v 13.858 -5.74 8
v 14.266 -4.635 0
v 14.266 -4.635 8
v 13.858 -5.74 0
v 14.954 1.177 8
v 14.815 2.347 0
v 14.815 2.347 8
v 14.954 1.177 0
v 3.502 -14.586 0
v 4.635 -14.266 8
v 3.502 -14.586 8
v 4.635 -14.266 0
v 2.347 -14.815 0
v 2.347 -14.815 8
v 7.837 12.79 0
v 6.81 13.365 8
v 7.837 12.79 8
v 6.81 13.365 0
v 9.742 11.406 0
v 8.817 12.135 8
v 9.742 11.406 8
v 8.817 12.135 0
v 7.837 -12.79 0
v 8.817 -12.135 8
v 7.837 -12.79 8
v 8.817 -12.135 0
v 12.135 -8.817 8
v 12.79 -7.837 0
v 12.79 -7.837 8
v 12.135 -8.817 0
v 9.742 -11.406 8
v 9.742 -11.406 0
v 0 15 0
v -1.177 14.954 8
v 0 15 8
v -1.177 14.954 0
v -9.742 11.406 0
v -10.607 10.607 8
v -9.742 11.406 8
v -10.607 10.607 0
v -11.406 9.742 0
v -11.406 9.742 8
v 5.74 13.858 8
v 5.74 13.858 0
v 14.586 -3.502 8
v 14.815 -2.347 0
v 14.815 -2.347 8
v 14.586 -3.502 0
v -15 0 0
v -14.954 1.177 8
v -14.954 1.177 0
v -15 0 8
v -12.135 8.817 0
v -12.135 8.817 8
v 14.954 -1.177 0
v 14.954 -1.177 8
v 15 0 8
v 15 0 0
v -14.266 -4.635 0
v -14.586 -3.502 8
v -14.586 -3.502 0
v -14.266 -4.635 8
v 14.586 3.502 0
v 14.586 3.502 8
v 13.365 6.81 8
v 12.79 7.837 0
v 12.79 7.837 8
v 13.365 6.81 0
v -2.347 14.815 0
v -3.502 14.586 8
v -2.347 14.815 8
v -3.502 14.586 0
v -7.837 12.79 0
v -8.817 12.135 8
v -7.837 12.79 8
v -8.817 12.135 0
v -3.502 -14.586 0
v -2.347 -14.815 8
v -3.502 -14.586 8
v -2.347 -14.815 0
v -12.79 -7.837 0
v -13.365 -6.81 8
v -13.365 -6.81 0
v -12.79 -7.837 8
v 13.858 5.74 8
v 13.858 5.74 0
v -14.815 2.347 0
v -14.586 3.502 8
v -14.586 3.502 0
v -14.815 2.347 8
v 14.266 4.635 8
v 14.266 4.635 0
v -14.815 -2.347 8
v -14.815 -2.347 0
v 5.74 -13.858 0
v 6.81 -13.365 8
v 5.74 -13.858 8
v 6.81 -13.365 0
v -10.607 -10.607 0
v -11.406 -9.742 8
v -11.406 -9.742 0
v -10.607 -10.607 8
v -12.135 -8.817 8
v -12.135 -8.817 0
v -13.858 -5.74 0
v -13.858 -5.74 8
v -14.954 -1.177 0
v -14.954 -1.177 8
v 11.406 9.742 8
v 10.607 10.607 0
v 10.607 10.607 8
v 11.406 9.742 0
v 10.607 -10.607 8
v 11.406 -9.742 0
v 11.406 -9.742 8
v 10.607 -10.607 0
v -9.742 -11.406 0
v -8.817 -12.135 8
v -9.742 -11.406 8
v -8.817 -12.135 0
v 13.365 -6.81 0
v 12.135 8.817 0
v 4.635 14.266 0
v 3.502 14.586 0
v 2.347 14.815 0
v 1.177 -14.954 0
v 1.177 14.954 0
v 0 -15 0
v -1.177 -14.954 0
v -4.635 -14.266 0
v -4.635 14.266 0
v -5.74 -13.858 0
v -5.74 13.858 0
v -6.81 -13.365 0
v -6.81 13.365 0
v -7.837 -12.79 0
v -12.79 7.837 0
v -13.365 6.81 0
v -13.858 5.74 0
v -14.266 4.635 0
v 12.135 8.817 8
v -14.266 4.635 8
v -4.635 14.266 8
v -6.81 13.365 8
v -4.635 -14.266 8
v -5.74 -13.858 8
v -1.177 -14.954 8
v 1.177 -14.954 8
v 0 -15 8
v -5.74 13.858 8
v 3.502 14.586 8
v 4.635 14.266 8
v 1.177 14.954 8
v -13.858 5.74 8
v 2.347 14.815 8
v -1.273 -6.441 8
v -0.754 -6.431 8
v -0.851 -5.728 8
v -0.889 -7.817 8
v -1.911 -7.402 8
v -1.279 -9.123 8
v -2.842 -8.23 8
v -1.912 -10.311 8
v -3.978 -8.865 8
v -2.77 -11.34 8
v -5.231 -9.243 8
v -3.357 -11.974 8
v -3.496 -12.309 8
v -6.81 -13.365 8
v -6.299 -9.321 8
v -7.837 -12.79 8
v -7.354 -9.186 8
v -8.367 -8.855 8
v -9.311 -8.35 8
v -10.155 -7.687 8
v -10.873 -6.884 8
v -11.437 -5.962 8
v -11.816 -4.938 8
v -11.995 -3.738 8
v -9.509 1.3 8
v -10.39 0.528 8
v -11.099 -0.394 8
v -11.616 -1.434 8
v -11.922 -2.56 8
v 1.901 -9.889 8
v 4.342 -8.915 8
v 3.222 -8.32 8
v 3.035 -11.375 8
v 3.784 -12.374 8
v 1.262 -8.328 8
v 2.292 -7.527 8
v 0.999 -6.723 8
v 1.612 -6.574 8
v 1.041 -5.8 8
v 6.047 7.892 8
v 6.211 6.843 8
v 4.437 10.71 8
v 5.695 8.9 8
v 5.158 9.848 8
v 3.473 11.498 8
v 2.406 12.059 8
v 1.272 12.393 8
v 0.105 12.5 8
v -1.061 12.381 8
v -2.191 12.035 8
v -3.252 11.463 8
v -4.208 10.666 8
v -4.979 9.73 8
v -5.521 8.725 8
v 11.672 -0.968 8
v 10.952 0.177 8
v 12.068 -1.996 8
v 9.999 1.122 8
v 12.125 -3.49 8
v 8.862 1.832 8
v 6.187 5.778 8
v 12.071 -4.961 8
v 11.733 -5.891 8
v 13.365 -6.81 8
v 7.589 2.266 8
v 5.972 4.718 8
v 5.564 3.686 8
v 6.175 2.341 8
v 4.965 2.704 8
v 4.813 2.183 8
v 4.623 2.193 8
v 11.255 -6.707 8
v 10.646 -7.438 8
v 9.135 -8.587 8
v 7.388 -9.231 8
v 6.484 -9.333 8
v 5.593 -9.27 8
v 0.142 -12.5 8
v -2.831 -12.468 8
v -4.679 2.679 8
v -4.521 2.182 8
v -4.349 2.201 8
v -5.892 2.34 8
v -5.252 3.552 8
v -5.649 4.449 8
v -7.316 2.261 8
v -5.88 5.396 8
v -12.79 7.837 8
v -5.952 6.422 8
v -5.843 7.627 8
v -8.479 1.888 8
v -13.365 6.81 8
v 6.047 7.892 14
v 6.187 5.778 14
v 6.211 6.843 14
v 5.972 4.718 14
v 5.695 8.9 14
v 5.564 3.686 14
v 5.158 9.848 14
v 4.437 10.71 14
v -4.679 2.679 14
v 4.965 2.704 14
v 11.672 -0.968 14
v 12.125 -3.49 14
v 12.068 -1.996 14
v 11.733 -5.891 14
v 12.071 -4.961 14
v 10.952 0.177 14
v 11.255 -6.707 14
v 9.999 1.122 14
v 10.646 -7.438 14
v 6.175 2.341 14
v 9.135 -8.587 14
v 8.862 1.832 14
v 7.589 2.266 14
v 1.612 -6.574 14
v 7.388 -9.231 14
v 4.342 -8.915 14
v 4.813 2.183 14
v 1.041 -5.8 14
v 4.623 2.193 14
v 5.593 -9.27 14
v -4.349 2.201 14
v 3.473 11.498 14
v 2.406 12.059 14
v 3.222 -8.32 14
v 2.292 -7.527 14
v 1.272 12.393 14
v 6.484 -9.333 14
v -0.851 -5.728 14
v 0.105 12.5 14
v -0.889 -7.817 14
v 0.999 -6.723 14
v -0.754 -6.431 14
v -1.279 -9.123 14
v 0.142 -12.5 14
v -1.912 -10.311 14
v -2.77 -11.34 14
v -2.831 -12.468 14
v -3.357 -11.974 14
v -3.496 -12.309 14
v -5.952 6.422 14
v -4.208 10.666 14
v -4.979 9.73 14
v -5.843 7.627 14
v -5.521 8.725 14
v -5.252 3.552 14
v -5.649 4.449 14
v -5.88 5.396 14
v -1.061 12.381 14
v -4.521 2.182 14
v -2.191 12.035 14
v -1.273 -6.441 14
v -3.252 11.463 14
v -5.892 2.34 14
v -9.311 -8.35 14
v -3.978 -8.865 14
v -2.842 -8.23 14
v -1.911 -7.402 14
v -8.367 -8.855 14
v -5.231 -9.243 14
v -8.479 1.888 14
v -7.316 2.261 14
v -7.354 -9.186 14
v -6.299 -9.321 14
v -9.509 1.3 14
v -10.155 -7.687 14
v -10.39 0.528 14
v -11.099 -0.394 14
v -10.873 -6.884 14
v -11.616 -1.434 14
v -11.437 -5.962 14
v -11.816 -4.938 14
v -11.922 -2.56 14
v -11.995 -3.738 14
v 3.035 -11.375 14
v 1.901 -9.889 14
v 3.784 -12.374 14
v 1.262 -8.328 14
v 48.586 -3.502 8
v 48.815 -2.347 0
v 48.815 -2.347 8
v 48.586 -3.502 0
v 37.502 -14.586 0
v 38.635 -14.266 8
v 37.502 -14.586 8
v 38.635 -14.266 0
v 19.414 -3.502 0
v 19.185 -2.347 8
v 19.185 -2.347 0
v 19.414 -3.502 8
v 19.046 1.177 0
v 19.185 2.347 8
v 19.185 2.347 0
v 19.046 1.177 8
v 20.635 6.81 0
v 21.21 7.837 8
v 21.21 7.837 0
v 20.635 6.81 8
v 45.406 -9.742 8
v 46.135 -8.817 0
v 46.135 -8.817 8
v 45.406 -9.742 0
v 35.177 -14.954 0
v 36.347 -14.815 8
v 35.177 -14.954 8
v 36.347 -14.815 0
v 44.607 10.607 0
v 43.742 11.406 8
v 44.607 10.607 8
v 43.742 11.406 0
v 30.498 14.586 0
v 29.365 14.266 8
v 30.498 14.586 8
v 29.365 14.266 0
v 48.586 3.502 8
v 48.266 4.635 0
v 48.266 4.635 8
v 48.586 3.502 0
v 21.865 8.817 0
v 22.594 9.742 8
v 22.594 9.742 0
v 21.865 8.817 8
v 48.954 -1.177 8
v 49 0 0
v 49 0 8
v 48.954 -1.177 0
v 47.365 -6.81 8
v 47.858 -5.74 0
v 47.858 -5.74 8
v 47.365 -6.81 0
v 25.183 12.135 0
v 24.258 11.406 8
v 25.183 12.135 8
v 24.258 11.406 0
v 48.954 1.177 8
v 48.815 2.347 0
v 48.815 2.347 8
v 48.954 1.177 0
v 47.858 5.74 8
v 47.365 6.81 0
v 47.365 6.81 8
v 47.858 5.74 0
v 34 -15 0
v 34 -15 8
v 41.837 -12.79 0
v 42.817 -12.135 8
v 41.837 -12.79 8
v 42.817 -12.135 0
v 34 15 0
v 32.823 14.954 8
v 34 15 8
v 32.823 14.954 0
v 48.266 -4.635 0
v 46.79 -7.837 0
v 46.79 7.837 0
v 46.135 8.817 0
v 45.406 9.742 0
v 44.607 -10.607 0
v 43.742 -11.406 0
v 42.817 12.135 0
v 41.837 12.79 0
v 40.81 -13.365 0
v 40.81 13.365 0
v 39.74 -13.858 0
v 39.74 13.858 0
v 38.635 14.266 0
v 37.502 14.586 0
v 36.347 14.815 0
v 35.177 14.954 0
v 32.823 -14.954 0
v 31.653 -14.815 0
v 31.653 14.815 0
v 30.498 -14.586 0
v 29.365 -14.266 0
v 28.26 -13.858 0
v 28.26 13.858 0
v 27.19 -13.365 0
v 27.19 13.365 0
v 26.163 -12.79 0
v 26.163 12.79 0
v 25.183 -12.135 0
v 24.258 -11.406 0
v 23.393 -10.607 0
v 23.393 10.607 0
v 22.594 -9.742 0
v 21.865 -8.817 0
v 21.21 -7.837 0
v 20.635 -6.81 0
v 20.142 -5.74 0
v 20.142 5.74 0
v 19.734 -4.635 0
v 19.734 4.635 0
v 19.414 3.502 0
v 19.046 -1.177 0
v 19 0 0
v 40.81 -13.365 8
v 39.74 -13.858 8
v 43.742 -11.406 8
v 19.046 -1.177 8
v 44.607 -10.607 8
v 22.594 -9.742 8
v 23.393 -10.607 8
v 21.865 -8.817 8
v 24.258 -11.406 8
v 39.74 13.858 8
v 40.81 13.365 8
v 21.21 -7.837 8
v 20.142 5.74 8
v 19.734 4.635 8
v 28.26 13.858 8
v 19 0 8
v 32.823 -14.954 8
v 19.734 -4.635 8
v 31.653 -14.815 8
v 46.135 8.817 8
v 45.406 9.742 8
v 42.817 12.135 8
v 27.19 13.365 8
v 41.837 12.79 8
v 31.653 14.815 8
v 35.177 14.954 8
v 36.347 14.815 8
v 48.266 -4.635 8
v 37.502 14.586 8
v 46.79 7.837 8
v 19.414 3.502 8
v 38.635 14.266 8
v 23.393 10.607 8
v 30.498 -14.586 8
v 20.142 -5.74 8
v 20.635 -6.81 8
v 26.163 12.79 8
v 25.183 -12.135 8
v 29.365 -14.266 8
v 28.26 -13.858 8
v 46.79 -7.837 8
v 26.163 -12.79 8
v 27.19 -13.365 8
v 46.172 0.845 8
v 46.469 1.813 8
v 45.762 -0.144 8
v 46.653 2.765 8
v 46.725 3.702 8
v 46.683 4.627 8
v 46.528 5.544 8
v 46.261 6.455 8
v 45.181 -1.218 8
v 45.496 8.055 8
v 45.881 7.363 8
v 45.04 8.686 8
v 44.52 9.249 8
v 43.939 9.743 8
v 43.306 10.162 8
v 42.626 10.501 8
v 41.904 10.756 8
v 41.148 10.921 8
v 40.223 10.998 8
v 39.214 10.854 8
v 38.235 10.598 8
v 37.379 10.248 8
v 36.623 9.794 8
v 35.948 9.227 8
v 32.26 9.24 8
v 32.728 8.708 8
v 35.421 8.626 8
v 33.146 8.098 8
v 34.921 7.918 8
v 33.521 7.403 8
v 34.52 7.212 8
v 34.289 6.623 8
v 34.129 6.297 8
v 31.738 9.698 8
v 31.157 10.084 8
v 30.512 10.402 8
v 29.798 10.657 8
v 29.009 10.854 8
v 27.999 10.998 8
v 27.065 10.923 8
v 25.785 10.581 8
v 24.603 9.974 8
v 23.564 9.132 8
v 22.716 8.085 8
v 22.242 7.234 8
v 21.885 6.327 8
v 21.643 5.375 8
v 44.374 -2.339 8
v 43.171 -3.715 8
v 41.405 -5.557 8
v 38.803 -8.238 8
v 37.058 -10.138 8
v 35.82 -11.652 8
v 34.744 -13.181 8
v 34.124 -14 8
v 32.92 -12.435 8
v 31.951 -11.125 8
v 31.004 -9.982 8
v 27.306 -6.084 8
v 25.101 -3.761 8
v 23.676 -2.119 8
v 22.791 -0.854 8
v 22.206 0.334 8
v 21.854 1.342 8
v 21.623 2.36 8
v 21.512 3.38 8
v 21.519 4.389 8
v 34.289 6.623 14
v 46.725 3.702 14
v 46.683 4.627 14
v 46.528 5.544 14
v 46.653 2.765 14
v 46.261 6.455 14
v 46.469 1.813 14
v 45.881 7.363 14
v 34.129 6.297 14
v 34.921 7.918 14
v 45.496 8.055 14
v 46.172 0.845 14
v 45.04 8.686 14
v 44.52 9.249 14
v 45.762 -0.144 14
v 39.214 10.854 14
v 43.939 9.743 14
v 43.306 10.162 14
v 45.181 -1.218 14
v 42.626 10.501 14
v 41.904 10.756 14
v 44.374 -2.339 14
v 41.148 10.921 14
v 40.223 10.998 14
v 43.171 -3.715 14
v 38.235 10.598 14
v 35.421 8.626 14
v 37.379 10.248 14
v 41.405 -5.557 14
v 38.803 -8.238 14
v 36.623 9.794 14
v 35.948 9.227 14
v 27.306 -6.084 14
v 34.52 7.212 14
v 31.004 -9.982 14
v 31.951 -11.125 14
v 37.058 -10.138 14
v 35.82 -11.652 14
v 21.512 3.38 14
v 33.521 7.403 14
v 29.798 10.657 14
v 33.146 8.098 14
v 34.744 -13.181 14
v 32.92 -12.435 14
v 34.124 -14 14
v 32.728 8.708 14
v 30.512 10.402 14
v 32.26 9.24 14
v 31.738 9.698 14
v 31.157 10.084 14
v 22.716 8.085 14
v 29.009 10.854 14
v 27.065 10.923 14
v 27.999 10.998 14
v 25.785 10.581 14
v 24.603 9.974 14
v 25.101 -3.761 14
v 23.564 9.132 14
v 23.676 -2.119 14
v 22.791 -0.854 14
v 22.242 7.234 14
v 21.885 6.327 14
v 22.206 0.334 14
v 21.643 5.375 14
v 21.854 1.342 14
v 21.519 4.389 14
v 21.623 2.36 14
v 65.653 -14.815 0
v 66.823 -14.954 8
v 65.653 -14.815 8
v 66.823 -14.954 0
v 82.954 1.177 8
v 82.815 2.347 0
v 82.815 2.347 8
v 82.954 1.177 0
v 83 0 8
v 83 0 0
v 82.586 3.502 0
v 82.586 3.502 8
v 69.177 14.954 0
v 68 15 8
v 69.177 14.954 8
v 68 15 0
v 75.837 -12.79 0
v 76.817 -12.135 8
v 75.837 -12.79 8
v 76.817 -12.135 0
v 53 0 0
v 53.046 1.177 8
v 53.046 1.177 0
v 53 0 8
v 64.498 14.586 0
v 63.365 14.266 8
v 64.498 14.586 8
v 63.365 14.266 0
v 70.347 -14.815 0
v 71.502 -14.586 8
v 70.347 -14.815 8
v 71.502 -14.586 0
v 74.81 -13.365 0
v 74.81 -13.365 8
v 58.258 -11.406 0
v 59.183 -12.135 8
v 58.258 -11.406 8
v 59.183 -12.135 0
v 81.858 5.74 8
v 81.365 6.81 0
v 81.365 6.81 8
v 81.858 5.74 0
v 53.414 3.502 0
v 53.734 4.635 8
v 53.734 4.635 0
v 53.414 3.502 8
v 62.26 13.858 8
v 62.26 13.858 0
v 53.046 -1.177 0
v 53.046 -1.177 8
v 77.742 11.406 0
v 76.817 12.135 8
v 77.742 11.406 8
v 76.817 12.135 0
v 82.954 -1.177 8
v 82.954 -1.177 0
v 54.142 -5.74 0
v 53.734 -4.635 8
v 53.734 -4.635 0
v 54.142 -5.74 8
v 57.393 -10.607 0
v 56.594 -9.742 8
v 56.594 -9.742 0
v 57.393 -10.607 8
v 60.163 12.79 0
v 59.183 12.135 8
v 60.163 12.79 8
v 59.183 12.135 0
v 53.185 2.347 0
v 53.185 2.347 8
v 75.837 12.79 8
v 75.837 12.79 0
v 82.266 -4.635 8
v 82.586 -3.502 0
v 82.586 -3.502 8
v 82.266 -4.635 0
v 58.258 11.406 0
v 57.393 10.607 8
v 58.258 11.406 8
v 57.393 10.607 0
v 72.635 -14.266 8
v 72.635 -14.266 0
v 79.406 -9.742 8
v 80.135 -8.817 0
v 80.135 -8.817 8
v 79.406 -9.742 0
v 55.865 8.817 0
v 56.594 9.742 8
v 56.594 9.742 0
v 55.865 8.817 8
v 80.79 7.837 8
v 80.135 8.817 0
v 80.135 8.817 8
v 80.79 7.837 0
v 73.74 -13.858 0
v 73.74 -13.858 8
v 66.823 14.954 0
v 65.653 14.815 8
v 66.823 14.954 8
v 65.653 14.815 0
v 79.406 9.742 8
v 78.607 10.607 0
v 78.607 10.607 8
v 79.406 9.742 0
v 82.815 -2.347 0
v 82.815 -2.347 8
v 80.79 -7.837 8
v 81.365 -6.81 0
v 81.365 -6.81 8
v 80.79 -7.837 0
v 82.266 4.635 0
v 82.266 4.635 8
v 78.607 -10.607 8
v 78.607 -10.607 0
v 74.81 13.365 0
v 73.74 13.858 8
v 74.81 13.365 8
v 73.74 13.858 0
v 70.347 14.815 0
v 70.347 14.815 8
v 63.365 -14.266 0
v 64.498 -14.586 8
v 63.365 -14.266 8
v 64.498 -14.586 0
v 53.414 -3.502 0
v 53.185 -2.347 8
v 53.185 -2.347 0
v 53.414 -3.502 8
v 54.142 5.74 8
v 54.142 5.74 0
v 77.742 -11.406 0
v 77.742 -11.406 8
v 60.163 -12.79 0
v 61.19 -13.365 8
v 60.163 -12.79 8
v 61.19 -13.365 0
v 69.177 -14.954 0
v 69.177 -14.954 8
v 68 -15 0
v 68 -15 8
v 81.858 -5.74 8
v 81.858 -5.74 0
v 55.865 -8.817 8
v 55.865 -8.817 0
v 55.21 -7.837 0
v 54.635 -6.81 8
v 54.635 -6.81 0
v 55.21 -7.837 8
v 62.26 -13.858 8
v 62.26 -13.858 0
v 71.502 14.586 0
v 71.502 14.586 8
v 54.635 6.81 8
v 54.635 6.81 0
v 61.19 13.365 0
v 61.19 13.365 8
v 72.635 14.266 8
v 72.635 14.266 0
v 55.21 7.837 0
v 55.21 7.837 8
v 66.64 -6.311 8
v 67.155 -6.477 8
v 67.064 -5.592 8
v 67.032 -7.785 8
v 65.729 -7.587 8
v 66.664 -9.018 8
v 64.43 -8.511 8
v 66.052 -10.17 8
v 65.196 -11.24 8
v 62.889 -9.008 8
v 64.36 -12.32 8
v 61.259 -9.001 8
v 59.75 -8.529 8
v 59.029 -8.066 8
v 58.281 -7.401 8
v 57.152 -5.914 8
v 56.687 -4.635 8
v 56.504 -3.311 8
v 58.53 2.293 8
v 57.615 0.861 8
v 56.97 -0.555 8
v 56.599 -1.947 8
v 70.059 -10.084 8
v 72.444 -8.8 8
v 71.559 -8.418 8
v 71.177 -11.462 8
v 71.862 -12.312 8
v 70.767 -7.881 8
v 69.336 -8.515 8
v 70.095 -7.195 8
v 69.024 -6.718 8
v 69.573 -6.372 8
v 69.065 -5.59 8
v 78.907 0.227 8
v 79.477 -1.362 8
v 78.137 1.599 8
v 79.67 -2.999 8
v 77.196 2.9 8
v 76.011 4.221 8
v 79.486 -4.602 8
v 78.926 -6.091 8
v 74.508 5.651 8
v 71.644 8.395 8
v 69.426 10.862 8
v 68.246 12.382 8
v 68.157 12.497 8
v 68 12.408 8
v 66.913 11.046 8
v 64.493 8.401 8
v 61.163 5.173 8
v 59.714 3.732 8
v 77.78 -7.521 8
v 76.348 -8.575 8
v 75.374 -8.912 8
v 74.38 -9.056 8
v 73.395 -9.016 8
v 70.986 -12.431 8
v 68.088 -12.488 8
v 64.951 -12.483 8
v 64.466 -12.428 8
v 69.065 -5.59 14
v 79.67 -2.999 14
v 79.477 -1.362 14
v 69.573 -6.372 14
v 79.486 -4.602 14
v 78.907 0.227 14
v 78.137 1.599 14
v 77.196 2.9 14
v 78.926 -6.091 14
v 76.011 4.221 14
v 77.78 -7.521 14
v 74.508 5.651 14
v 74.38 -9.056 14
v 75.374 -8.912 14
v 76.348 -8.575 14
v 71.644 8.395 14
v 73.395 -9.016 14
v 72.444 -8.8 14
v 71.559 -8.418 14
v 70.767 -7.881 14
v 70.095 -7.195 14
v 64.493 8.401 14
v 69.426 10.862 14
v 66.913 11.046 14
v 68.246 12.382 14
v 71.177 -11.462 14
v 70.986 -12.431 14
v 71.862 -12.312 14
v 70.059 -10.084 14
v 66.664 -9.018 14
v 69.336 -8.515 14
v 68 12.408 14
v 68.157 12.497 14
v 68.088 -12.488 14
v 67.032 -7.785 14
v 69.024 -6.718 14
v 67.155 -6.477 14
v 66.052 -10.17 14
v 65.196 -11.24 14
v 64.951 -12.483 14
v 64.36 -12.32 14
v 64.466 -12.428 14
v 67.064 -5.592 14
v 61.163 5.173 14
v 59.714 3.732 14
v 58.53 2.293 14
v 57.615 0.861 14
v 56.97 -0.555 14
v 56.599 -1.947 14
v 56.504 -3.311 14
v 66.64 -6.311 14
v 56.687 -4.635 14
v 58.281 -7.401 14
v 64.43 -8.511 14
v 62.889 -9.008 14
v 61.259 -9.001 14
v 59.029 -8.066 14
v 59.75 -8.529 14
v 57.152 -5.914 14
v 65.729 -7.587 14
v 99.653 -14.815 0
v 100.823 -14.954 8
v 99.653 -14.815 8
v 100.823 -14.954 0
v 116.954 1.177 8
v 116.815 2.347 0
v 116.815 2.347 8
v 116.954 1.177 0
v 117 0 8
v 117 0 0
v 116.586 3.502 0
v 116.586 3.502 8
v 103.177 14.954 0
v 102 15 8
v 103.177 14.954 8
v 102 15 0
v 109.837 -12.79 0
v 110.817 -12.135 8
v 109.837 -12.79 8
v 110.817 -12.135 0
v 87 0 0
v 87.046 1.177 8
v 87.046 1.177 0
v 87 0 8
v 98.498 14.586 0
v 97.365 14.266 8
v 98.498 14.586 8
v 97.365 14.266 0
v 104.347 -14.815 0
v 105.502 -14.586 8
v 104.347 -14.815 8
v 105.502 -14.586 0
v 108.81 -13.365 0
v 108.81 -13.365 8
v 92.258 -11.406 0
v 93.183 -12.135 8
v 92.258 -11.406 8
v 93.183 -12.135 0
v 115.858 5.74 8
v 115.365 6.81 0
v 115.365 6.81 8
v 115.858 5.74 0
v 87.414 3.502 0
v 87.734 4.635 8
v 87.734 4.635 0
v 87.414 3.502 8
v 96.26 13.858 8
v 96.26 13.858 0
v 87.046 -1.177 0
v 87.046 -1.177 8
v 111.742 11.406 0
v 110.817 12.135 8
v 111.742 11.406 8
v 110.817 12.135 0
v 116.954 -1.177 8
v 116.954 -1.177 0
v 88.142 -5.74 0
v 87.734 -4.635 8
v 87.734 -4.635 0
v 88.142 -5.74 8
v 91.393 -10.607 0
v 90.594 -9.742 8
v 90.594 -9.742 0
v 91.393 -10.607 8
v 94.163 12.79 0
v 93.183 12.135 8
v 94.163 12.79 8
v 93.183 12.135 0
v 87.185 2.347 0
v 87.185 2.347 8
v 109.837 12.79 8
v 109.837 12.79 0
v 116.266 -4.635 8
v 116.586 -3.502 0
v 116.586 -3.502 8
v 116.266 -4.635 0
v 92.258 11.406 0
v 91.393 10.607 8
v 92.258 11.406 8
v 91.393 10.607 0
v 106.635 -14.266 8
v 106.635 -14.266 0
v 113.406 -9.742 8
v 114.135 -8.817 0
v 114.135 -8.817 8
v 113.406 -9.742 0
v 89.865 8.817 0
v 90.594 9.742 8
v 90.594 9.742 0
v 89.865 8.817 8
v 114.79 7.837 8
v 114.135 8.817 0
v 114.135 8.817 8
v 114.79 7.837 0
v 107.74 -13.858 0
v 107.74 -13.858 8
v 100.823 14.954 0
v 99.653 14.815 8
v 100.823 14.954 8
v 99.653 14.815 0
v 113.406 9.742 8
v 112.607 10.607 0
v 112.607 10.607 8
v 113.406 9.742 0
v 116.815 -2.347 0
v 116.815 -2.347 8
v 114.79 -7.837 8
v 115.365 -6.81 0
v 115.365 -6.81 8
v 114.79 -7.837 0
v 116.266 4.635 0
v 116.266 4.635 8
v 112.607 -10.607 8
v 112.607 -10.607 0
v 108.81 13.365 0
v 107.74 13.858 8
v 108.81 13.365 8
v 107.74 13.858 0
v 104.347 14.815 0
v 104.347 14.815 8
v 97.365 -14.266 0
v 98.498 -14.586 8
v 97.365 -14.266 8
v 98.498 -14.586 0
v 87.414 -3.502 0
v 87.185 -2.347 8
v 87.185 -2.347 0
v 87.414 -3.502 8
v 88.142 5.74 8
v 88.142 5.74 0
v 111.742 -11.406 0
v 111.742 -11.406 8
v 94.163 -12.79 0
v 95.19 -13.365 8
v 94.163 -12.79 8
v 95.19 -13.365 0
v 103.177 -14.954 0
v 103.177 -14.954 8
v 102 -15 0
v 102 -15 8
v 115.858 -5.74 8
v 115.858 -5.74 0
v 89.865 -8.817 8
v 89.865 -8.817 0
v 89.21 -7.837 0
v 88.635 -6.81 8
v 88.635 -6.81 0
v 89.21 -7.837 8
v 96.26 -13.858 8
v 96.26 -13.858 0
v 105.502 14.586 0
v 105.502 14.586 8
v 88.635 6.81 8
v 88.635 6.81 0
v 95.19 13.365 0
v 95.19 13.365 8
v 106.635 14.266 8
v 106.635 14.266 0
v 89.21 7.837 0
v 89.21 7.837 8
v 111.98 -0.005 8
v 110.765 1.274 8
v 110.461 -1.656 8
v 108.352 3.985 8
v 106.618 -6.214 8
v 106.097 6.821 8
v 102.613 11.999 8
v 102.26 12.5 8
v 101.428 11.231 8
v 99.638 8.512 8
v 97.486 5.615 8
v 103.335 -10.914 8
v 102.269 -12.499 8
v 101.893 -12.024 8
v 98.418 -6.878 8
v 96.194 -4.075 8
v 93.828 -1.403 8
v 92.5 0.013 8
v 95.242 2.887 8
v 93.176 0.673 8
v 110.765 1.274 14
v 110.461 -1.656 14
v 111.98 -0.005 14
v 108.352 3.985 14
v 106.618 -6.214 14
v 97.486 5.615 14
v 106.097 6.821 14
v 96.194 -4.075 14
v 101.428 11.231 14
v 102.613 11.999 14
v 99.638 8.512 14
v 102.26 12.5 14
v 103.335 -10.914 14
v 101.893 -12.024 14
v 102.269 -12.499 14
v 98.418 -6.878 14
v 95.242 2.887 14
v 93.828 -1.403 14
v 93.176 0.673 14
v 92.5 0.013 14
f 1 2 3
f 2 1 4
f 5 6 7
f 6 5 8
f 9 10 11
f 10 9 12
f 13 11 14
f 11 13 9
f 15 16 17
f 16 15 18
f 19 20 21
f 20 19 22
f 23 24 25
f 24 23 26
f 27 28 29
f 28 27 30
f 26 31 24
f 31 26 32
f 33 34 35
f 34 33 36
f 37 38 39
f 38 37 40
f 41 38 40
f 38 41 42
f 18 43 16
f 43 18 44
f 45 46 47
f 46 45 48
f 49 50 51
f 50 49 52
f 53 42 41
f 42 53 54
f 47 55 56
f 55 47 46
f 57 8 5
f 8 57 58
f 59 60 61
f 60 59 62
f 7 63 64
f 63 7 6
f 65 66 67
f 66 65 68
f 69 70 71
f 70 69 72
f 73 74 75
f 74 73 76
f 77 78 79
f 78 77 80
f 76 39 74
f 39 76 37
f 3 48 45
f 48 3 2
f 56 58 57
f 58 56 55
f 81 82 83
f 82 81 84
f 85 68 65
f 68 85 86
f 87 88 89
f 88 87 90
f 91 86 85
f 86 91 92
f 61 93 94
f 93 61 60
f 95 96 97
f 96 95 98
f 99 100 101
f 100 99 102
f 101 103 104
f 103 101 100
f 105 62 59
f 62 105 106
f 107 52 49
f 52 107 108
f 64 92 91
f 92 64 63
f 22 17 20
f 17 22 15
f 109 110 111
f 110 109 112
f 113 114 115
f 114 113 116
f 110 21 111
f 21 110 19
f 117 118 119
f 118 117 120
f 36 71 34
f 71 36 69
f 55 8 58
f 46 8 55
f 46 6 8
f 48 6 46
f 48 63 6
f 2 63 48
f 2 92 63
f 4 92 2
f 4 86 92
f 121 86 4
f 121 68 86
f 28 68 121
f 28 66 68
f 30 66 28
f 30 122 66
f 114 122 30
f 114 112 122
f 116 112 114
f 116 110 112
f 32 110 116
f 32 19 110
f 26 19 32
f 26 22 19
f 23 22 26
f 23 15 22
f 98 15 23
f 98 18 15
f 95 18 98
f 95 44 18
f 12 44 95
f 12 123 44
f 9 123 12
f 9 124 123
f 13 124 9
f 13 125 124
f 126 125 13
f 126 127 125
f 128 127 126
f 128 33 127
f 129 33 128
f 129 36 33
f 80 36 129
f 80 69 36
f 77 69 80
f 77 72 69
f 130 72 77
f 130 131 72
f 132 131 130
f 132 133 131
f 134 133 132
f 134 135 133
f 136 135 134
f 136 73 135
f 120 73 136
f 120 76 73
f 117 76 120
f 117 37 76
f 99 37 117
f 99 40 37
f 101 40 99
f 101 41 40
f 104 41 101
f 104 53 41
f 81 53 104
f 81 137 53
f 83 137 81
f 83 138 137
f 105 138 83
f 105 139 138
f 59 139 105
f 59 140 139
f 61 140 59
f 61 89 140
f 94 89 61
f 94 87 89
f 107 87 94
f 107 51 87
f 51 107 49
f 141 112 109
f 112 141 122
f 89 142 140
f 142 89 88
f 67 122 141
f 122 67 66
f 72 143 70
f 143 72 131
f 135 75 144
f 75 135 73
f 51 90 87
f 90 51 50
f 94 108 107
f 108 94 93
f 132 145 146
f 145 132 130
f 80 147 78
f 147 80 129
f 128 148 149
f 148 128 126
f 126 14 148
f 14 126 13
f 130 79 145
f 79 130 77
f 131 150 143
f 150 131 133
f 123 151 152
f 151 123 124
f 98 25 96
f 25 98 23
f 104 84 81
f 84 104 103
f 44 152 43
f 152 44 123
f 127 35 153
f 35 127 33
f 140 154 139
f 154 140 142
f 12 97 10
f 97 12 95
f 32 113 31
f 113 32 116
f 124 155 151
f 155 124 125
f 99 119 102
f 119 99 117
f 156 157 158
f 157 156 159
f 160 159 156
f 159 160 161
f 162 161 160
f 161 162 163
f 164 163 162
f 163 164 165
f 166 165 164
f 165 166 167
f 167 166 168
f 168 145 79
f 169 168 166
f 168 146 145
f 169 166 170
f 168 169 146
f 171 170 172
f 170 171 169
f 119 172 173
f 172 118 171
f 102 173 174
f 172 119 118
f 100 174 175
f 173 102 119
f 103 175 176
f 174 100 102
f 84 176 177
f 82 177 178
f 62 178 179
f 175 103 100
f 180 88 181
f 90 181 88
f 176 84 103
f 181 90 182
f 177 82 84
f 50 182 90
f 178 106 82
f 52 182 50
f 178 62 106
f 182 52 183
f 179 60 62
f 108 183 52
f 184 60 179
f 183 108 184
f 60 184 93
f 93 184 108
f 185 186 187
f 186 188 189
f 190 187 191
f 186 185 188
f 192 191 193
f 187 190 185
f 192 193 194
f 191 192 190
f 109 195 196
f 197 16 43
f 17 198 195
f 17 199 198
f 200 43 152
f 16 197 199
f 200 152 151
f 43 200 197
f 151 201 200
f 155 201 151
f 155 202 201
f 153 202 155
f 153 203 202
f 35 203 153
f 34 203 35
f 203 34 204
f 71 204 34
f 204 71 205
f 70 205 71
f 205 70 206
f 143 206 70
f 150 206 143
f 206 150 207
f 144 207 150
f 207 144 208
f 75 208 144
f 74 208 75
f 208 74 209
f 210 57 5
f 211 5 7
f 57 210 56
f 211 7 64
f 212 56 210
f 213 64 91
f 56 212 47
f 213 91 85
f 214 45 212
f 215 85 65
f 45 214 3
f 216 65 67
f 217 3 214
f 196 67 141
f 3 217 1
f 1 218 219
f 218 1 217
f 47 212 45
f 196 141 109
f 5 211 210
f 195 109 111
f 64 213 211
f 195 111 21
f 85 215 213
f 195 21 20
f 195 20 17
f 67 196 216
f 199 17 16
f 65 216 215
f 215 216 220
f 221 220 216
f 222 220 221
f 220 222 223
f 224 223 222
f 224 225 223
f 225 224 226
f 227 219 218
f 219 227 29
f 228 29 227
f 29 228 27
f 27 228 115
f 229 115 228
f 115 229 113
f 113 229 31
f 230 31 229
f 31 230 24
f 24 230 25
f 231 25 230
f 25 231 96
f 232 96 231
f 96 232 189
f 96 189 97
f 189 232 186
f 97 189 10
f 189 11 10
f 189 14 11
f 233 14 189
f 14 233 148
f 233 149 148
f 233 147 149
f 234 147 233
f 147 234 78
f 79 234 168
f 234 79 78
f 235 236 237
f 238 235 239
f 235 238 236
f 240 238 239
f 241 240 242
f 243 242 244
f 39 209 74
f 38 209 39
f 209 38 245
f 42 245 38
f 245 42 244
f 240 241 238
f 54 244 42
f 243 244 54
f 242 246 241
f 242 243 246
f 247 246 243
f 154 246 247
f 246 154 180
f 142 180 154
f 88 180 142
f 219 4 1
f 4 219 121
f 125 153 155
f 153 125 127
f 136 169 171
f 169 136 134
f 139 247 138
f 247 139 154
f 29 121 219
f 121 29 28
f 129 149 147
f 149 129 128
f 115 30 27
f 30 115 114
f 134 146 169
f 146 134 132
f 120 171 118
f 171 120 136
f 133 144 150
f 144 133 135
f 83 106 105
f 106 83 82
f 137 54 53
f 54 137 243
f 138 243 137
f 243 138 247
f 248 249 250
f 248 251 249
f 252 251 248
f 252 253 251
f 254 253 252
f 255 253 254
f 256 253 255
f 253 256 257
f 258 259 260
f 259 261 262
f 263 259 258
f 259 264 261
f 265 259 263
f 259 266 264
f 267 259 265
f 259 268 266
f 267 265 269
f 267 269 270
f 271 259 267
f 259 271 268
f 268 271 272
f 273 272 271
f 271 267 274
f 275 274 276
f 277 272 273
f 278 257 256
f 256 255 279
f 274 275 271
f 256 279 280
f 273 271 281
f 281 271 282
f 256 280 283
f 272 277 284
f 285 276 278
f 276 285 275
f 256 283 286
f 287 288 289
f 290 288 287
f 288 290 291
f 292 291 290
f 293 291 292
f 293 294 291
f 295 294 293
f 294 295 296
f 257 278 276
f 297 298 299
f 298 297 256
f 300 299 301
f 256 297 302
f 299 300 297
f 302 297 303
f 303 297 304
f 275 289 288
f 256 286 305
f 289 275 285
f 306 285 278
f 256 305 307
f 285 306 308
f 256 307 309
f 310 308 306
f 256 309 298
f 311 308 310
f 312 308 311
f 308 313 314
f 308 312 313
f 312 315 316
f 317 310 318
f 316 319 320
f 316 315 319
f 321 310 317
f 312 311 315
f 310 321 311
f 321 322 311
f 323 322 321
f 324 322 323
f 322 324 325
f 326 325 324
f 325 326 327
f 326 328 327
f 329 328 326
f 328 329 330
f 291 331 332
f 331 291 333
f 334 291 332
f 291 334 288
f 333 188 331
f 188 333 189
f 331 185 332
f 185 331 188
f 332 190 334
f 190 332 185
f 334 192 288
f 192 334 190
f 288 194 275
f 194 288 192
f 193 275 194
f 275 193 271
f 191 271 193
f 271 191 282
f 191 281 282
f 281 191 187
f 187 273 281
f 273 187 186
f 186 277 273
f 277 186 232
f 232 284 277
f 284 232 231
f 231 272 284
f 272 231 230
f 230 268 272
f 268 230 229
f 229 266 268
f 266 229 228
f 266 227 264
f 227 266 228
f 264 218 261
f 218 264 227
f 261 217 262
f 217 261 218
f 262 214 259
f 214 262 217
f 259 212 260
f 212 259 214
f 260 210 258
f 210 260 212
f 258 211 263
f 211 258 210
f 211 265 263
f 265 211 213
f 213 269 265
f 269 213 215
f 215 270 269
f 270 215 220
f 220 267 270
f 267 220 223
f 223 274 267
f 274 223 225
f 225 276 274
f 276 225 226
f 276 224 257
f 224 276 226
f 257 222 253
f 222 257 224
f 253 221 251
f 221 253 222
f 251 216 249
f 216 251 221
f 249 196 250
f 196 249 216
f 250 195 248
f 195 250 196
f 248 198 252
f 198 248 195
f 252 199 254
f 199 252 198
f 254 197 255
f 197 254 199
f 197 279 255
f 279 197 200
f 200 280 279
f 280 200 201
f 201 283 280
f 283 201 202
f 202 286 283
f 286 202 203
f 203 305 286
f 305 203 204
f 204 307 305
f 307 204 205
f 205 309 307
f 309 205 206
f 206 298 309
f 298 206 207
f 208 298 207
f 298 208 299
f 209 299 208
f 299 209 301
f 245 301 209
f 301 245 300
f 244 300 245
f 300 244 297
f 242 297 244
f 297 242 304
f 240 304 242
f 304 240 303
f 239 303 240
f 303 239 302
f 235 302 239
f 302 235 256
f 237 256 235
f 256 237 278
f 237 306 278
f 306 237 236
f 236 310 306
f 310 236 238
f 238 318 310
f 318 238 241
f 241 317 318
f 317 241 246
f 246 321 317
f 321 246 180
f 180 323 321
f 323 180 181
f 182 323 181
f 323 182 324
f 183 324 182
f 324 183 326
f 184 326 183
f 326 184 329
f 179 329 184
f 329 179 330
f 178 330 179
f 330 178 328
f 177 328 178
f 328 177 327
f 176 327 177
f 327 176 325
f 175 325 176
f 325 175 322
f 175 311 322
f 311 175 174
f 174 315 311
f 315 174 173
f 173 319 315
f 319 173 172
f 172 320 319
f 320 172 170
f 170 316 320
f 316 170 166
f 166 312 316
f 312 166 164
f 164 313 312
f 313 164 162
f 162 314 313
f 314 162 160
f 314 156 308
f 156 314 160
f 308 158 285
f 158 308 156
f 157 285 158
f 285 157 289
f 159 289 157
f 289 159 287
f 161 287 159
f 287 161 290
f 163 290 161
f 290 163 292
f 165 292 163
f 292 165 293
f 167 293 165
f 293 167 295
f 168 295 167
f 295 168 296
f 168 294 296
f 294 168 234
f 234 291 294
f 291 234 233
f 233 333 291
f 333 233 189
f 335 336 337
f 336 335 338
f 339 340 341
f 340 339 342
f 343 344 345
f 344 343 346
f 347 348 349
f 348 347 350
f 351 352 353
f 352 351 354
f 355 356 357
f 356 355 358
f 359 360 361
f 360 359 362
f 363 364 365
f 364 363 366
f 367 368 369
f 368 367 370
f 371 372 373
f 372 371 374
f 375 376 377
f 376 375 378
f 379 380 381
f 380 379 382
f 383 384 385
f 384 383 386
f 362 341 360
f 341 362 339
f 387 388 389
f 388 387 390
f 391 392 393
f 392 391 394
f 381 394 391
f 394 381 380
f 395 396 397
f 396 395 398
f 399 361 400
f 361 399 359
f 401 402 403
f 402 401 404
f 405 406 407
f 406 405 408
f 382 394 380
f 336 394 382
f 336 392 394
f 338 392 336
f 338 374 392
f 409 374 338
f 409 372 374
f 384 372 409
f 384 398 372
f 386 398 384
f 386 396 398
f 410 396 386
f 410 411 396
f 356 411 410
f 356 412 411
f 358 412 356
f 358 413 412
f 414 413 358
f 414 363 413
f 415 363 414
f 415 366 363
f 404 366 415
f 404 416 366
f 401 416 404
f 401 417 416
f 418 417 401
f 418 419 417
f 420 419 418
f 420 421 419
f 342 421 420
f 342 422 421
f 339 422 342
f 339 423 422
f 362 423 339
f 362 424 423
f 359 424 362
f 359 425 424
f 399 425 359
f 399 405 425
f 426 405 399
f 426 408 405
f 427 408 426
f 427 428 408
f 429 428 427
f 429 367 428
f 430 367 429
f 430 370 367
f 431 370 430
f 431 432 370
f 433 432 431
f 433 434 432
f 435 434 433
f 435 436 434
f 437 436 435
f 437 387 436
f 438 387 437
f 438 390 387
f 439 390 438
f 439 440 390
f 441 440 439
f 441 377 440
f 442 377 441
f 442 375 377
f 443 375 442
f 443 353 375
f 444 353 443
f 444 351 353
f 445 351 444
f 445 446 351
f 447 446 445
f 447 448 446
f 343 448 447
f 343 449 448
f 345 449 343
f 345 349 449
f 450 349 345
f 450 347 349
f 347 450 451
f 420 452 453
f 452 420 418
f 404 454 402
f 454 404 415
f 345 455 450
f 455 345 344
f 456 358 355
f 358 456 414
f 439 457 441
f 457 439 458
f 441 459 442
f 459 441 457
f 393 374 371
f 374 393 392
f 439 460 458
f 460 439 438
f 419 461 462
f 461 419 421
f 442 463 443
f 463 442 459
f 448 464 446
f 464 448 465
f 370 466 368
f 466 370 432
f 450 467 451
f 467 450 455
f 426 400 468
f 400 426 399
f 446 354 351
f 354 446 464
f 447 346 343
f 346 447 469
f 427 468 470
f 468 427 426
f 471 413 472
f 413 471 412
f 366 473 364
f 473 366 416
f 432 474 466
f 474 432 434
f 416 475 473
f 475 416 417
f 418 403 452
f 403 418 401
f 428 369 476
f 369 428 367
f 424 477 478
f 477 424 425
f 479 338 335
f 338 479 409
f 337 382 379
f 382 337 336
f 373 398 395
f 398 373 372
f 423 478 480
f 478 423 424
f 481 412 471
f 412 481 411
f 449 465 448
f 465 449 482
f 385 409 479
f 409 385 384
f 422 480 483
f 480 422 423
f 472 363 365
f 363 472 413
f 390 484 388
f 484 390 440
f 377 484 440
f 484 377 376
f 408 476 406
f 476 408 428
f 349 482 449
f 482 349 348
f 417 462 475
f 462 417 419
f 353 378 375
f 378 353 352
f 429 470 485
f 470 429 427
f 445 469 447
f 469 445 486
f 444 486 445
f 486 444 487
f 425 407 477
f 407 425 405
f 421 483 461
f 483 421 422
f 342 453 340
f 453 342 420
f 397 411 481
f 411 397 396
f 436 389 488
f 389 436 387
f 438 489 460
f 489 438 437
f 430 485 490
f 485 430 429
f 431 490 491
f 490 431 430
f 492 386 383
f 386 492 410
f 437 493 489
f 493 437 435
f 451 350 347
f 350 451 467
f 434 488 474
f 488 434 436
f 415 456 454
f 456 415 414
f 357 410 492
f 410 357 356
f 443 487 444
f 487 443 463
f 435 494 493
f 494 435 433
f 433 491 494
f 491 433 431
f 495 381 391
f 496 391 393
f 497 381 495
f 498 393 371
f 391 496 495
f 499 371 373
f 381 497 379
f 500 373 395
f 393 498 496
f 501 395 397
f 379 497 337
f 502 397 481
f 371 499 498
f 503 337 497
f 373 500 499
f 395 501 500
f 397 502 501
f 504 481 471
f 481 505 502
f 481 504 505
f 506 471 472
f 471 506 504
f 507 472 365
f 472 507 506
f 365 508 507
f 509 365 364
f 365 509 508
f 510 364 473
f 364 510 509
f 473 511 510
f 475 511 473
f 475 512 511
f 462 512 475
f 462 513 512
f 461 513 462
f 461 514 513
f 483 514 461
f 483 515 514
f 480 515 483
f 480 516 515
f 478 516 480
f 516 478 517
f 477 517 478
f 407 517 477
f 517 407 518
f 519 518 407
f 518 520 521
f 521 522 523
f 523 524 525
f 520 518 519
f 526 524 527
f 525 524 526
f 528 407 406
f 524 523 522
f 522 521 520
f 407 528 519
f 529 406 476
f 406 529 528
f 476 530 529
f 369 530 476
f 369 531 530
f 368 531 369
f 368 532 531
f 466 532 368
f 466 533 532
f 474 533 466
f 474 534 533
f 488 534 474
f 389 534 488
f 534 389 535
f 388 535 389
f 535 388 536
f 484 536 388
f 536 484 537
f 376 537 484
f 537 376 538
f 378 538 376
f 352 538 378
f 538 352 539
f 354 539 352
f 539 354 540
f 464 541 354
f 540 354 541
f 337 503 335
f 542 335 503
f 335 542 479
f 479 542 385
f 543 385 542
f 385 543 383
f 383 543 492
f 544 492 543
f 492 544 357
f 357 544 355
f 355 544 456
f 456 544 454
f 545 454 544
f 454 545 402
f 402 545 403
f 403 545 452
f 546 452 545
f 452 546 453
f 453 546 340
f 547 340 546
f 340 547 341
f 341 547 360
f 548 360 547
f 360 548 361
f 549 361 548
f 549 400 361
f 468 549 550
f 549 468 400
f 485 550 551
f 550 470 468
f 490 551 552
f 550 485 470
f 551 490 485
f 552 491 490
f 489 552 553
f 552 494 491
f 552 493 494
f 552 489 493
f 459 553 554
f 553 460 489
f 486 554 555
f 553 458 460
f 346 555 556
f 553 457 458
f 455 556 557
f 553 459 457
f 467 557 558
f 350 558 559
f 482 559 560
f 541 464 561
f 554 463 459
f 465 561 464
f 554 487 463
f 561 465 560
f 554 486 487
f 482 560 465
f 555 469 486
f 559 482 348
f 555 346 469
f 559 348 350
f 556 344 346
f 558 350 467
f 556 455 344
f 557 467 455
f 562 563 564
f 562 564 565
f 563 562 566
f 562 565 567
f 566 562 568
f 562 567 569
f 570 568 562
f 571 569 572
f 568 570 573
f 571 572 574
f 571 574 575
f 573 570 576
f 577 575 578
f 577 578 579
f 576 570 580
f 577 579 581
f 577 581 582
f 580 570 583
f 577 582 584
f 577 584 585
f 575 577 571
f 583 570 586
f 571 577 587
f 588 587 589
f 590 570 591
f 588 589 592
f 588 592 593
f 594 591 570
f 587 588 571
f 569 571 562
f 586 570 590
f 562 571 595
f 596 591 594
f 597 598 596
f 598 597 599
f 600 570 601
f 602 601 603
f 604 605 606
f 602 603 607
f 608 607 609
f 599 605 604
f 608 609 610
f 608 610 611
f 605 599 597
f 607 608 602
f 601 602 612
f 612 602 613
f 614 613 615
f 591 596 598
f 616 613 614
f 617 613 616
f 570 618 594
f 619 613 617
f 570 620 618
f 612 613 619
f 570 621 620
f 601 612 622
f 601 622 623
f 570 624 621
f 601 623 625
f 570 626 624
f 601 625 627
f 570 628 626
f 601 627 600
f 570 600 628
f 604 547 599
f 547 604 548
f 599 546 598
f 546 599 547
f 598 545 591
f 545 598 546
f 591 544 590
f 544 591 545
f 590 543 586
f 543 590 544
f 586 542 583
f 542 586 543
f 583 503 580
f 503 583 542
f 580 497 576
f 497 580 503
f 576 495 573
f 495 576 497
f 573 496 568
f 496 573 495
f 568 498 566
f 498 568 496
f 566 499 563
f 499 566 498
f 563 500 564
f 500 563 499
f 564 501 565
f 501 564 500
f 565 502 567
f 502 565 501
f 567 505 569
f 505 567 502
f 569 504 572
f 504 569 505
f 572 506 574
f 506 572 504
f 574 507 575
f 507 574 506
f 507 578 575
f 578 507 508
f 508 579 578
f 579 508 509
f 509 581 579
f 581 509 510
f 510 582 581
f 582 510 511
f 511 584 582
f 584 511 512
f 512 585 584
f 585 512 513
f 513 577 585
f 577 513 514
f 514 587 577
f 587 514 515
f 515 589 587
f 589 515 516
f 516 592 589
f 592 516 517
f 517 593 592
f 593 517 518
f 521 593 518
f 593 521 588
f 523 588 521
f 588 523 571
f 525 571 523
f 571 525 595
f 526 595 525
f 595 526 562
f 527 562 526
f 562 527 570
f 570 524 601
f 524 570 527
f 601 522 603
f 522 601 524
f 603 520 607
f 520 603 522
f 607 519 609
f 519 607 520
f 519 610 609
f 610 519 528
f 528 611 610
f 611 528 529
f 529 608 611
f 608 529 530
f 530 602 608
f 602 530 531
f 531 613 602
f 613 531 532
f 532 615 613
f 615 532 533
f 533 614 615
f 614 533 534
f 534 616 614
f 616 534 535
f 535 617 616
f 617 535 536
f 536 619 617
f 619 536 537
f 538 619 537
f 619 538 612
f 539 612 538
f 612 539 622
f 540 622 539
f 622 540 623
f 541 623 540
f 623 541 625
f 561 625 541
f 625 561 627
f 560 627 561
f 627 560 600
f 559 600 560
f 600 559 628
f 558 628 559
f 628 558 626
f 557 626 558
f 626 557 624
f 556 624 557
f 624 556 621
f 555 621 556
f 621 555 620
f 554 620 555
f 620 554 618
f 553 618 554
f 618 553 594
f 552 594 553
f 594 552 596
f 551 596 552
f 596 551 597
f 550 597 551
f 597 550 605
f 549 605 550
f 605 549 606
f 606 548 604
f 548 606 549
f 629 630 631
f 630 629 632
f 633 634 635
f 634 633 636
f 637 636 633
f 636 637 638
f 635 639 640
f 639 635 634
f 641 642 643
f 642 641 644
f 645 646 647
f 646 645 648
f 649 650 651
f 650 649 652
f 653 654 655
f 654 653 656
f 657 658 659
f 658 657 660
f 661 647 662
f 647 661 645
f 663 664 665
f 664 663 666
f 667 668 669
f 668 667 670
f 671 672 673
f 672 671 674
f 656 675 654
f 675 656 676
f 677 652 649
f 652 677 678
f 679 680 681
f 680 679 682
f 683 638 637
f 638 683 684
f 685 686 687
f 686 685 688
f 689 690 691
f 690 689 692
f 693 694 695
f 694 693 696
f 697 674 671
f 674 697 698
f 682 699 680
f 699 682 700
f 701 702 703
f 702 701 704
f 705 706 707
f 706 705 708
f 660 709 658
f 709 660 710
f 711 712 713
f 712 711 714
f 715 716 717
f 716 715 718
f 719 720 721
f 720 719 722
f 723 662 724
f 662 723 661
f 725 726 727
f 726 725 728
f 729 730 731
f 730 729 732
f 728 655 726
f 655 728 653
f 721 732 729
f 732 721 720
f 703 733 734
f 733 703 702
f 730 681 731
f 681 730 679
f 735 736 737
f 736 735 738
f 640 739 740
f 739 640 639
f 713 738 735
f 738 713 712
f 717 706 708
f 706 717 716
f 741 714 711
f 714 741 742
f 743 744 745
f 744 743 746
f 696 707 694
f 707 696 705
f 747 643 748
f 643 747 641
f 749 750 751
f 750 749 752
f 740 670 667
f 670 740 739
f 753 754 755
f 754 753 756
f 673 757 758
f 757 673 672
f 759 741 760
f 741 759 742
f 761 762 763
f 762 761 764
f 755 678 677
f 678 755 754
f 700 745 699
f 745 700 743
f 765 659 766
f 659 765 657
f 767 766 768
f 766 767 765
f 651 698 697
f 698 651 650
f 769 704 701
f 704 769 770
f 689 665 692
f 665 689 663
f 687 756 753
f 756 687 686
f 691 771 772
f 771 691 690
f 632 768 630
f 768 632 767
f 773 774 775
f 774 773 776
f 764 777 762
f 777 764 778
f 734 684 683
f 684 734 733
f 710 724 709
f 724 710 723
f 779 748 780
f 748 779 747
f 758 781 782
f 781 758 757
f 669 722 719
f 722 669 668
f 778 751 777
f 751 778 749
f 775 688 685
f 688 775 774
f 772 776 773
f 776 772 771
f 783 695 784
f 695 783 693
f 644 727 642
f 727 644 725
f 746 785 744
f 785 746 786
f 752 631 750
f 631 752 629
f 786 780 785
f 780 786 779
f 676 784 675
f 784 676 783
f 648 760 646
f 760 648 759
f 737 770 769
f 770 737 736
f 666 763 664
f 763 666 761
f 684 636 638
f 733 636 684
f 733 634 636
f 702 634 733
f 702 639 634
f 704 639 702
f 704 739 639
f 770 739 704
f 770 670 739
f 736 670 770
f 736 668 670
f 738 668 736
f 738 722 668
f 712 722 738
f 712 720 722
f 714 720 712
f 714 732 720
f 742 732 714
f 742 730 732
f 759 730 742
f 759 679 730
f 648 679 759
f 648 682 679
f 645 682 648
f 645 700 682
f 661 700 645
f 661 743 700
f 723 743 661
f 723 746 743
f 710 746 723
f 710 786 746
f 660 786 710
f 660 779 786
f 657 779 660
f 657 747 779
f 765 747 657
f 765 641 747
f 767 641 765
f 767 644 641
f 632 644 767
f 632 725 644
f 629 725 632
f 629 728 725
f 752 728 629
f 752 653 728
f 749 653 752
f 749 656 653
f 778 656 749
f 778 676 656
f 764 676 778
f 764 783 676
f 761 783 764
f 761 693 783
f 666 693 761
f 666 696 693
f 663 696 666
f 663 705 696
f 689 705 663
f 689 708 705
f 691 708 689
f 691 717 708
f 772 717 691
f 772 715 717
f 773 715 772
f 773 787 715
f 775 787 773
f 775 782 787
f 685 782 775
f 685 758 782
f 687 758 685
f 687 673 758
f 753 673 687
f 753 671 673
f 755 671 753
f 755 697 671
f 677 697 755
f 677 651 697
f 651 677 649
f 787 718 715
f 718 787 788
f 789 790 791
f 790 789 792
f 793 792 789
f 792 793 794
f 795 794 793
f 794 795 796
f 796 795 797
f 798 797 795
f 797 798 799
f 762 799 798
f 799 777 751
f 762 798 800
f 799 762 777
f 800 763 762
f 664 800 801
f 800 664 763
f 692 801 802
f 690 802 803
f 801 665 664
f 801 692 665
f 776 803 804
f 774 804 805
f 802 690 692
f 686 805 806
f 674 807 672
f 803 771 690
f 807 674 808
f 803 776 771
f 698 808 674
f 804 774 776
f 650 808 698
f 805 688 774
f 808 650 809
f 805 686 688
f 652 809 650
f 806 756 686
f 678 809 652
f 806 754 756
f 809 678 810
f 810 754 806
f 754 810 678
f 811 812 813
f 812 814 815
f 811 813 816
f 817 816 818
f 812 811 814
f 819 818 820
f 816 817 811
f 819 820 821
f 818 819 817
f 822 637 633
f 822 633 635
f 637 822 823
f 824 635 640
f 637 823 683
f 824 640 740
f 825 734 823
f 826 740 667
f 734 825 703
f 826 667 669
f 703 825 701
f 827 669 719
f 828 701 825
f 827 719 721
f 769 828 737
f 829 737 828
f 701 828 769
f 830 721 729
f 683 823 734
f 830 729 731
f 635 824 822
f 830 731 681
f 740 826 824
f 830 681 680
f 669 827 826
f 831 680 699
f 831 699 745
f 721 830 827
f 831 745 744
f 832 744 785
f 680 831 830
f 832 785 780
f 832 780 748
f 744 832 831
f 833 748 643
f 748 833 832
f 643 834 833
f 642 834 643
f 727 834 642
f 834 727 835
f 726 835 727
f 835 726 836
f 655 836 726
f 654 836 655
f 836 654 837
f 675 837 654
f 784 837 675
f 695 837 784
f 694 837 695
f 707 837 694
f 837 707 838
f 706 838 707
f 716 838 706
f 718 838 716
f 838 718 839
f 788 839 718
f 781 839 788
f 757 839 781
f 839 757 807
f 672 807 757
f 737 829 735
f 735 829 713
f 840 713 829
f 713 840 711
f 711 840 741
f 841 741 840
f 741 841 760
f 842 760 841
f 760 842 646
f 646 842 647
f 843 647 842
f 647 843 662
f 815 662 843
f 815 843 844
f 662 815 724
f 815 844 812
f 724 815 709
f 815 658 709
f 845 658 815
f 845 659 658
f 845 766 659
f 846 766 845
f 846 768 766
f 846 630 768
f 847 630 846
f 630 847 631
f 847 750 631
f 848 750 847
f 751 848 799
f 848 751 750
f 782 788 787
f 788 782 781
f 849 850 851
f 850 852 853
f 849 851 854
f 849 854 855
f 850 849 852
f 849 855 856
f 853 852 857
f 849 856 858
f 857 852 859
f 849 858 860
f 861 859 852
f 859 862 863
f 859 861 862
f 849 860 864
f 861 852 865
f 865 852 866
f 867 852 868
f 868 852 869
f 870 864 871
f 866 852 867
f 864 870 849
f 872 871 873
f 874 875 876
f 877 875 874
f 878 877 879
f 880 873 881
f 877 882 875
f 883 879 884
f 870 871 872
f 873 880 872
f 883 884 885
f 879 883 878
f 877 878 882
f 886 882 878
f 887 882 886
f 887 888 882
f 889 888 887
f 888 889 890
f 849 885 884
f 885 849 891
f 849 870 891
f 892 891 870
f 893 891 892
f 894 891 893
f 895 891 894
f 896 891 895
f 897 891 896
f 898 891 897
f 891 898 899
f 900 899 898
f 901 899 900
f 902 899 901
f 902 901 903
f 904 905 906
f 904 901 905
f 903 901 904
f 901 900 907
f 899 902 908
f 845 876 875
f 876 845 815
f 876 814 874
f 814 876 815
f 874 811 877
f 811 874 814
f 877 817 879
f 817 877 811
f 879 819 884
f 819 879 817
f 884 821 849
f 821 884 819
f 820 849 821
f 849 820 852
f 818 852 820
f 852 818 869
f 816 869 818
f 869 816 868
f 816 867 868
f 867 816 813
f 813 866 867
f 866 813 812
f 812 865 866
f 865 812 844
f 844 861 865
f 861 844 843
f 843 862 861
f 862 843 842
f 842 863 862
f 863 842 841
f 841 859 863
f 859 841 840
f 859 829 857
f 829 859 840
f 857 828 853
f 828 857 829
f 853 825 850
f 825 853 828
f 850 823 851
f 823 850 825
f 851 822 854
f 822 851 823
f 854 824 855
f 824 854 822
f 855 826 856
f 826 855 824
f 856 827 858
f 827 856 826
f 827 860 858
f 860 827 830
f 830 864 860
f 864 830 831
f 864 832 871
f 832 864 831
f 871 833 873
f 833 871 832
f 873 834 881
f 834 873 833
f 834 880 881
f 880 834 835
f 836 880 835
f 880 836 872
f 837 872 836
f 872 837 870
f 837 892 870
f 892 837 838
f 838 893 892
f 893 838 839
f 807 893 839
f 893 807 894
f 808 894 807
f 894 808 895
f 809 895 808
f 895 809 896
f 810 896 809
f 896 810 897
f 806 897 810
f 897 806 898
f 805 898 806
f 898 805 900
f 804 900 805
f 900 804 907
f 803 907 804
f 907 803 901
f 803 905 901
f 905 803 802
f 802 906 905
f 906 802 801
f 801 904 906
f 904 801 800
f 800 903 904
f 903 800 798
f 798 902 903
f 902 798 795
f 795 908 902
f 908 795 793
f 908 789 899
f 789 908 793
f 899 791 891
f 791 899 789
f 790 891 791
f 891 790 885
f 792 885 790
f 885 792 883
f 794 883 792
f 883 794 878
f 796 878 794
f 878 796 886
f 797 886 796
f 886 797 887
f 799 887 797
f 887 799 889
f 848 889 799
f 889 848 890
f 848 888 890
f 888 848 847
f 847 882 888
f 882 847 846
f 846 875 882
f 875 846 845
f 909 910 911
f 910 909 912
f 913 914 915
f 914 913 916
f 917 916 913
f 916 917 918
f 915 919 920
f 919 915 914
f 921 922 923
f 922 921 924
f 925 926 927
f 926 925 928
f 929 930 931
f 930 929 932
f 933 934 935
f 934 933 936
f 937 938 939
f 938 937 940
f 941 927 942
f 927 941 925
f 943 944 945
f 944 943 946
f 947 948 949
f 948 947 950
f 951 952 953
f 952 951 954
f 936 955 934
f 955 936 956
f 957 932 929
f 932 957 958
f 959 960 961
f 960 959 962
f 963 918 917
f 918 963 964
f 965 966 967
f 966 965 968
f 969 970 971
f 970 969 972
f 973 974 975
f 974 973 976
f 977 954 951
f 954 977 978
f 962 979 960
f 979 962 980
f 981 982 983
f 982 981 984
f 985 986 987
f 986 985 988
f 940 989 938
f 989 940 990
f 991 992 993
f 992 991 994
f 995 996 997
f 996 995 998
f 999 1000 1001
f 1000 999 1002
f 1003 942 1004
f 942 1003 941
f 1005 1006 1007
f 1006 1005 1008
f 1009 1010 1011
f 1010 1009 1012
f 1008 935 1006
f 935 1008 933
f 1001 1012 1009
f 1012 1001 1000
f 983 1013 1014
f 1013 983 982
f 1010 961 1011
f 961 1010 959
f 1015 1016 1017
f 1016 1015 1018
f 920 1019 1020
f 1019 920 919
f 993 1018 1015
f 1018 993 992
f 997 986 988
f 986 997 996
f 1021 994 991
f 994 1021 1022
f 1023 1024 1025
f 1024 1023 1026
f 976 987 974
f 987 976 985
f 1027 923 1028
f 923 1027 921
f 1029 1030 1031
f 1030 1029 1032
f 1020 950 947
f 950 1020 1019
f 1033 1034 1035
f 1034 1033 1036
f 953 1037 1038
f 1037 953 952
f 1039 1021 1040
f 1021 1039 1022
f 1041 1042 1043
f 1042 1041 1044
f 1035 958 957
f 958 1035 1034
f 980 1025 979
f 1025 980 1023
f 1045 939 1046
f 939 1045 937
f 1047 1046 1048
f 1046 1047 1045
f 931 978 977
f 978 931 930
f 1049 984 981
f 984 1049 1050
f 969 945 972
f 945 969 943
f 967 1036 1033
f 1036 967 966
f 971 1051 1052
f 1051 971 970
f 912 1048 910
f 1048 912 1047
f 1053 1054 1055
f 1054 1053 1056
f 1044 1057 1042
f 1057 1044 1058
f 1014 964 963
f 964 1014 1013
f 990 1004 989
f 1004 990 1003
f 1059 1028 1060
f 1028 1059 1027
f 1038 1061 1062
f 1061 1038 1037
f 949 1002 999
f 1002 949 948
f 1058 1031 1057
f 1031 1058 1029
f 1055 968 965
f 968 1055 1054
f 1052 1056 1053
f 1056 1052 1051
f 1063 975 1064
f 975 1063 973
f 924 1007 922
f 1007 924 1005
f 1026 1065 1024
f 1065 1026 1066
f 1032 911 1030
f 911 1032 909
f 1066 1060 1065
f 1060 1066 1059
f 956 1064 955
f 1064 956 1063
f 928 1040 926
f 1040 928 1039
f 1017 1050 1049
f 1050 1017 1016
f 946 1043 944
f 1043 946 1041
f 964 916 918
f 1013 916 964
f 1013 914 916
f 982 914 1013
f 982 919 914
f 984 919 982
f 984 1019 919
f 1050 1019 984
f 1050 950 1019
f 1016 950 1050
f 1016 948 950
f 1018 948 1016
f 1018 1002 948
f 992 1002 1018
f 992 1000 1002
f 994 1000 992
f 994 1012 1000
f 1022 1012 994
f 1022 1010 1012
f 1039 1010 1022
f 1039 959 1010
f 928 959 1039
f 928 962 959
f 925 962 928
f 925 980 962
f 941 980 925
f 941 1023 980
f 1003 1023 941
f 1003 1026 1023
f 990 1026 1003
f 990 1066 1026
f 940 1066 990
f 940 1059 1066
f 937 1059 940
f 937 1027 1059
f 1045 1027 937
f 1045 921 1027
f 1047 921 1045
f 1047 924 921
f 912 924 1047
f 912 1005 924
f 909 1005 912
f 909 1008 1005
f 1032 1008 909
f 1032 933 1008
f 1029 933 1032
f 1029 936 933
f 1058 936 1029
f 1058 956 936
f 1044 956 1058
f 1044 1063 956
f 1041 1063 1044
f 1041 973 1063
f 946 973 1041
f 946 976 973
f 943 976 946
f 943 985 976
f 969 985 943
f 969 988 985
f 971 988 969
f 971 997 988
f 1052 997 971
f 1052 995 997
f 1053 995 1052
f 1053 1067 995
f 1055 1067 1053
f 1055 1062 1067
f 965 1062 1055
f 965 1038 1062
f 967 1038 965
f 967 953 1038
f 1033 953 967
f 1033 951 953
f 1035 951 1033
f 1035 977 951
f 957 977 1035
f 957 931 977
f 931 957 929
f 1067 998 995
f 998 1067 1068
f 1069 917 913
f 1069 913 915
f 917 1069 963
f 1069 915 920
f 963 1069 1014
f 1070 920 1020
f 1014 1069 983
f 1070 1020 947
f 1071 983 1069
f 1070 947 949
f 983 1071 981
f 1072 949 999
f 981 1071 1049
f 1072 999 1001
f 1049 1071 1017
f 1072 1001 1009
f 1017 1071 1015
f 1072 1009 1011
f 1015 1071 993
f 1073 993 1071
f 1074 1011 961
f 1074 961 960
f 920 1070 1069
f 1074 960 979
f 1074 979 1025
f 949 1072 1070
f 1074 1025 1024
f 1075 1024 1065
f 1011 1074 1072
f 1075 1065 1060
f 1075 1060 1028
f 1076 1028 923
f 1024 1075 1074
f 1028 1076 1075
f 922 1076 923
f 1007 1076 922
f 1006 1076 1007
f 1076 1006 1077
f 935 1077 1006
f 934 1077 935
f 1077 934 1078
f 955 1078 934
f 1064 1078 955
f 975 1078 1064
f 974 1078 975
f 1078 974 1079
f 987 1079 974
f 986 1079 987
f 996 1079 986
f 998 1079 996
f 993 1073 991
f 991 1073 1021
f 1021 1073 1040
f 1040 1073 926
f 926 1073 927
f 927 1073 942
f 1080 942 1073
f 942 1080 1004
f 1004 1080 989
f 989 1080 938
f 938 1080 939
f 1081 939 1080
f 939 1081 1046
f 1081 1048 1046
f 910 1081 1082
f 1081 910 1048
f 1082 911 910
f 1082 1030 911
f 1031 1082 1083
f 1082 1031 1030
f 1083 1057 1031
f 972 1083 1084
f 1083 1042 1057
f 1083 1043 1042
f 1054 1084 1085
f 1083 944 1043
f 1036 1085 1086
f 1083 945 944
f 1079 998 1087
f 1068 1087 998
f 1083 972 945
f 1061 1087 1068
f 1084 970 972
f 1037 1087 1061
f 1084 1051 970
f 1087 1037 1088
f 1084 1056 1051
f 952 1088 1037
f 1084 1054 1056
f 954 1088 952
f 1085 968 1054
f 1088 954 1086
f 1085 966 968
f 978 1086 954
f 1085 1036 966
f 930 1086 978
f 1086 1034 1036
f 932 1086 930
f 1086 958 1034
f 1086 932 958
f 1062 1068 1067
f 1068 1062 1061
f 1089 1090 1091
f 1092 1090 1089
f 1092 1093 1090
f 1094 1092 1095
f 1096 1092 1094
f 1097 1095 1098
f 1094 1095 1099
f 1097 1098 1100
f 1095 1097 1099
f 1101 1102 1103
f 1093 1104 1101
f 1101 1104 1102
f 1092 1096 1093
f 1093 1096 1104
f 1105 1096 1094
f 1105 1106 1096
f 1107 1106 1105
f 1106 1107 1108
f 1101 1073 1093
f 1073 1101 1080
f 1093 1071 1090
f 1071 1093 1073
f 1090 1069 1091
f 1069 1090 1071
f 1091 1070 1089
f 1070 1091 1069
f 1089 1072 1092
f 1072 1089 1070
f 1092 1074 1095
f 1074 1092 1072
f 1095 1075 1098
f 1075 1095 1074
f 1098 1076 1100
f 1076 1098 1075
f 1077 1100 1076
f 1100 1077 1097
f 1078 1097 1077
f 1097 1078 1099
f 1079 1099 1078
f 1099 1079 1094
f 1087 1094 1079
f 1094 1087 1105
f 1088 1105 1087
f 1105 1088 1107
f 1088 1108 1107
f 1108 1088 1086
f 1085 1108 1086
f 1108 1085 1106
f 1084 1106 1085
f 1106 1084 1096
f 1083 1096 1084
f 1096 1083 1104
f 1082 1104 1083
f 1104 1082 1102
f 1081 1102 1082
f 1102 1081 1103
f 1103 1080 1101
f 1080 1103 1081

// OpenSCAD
// file: ../stamp.scad
module stamp(stampHeight = 6, holderHeight = 8, holderRadius = 15) {
  cylinder(r = holderRadius, h = holderHeight);
  
  translate([0, 0, holderHeight])
  linear_extrude(height = stampHeight)
  children();
}
// main file
use <../stamp.scad>;

$fn = 80;

stamp()
translate([-12, -12.5]) // center the geometry around [0,0]
import("club.dxf");

translate([34, 0, 0])
stamp()
translate([-12.5, -14]) // center the geometry around [0,0]
import(file = "heart.dxf");

translate([68, 0, 0])
stamp()
translate([-11.5, -12.5]) // center the geometry around [0,0]
import(file = "pick.dxf");

translate([102, 0, 0])
stamp()
translate([-9.5, -12.5]) // center the geometry around [0,0]
import(file = "diamond.dxf");
